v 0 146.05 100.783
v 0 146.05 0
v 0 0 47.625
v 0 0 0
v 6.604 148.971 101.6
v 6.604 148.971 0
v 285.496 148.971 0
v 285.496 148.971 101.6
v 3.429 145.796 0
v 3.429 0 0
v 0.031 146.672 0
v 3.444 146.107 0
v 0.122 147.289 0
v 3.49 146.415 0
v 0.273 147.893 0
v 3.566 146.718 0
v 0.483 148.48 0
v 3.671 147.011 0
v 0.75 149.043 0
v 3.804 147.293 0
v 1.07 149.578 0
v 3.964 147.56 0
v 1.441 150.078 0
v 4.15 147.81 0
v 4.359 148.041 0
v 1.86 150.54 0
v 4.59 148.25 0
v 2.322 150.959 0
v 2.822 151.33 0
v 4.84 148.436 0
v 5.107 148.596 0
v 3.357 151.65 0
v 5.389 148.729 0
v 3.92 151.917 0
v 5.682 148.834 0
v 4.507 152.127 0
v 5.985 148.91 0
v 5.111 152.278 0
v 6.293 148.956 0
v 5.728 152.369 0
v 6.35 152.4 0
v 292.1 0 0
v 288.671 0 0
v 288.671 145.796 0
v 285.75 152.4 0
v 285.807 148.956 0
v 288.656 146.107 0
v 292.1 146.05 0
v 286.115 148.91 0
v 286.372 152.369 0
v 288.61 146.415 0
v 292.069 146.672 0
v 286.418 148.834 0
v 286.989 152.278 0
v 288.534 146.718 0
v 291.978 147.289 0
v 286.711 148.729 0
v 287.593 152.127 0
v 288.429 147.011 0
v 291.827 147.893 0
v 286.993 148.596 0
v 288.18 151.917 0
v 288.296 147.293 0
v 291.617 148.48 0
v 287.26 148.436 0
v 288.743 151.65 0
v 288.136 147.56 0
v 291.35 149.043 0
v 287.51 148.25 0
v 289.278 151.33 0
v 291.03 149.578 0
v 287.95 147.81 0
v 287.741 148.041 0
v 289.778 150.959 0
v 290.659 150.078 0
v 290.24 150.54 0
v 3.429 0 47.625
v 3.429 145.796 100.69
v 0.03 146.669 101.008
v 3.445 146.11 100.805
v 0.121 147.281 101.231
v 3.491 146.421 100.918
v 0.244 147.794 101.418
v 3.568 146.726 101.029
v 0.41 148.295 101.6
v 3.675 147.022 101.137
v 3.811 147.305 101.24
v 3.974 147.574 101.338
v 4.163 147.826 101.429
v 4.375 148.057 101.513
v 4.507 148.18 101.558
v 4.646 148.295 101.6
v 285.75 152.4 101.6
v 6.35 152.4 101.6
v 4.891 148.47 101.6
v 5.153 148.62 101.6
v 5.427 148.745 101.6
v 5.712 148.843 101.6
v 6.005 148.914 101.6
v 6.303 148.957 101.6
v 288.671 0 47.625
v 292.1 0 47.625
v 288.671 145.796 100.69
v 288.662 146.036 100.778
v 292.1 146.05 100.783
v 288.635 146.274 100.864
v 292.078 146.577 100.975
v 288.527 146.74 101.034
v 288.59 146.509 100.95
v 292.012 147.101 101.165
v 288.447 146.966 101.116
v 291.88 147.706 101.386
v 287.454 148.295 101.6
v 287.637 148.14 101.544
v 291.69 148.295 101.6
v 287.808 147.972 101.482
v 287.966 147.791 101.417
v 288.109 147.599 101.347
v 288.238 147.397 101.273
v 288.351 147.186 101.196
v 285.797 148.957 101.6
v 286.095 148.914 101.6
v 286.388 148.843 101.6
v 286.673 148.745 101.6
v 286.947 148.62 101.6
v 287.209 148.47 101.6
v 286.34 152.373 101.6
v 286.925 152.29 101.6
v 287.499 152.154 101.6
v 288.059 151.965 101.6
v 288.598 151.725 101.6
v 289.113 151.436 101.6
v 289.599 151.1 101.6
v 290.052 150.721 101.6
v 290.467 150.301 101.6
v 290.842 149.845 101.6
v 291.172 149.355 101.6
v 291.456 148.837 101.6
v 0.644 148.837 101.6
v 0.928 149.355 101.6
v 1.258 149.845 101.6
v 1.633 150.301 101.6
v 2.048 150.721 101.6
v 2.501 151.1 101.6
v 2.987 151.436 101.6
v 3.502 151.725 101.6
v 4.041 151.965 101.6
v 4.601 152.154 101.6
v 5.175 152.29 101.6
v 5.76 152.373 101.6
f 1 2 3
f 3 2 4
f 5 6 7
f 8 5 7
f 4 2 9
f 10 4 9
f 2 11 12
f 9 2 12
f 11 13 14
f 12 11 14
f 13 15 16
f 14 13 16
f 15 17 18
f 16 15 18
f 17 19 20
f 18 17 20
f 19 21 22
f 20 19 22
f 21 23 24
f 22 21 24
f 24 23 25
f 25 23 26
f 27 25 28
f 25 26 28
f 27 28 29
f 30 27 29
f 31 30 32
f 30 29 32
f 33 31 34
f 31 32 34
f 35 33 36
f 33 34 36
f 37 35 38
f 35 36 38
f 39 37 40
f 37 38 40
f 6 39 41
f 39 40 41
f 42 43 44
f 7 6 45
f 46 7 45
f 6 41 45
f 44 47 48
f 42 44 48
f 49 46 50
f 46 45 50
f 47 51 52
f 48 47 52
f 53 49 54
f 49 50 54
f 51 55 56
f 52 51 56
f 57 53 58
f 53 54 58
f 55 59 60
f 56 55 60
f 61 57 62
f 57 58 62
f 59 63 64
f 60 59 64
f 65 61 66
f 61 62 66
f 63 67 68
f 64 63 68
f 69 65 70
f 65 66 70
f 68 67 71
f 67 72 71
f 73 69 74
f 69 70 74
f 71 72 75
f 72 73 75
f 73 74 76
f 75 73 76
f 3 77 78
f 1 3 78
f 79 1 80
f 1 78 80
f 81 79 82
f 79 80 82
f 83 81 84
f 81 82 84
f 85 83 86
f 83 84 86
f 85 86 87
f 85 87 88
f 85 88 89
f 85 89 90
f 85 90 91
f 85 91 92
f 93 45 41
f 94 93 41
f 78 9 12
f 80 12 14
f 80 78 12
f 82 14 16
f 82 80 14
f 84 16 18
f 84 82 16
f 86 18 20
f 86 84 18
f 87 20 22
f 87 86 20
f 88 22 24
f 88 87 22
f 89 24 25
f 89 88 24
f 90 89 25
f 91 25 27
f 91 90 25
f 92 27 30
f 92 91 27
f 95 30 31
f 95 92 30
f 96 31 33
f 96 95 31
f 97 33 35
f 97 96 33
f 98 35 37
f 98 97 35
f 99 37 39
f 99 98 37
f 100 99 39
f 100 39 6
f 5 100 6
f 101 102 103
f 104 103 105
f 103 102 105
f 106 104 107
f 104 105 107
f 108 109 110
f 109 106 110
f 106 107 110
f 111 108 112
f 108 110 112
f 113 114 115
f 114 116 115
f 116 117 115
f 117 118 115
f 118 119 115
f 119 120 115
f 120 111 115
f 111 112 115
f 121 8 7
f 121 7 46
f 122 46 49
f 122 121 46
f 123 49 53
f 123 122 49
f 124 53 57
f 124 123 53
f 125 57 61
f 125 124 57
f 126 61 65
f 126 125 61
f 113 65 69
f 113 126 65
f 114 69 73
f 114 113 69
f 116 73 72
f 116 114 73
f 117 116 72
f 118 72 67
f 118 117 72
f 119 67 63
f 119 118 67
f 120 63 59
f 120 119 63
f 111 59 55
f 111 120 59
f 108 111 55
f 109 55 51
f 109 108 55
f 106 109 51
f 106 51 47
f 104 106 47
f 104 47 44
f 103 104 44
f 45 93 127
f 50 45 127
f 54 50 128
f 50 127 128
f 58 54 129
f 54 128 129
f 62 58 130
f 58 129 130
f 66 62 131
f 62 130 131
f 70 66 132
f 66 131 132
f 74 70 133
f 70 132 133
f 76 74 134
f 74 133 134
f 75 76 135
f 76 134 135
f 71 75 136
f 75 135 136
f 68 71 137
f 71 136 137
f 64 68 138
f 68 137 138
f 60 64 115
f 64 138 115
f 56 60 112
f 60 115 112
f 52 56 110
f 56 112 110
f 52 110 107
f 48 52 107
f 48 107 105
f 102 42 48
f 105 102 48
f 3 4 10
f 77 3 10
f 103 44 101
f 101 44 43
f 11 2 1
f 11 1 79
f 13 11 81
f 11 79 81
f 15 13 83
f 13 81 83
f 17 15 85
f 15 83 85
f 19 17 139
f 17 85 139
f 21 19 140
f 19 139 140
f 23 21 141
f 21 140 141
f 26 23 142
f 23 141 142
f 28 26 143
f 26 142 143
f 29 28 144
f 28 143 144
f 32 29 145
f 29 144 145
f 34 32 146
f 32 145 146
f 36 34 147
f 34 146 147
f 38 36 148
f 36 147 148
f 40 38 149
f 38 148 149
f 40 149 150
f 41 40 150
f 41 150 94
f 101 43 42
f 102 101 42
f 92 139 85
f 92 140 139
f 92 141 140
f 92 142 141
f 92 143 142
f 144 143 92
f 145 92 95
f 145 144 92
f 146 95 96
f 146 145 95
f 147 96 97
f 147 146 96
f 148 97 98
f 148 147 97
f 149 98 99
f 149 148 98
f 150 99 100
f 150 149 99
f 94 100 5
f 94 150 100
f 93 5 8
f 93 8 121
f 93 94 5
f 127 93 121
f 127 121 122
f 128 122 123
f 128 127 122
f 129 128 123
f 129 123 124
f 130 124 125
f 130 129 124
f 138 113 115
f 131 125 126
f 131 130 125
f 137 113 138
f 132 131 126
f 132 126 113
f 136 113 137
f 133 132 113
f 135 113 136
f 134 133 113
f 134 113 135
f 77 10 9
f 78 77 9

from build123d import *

# Parameters (mm, degrees)
F1_DEPTH = 101.6
F3_DEPTH = 292.101
F4_R     = 3.175
F5_R     = 6.35


with BuildPart() as f1:
    # F0 (on Top) → F1 (new body)
    with BuildSketch(Plane.XY):
        Polygon((0, 152.4), (0, 0), (3.429, 0), (3.429, 148.971), (288.671, 148.971), (288.671, 0), (292.1, 0), (292.1, 152.4), align=None)
    extrude(amount=F1_DEPTH)

    # F2 (on face) → F3 (cut, through all)
    with BuildSketch(Plane.YZ.offset(292.1)):
        Polygon((0, 101.6), (0, 47.625), (148.295094, 101.6), align=None)
    extrude(amount=-F3_DEPTH, mode=Mode.SUBTRACT)

    # F4
    f4_edges = [f1.edges().sort_by_distance(p)[0] for p in [
        (288.671, 148.971, 50.8),
        (3.429, 148.971, 50.8),
    ]]
    fillet(f4_edges, radius=F4_R)

    # F5
    f5_edges = [f1.edges().sort_by_distance(p)[0] for p in [
        (0, 152.4, 50.8),
        (292.1, 152.4, 50.8),
    ]]
    fillet(f5_edges, radius=F5_R)


solid = f1.part
